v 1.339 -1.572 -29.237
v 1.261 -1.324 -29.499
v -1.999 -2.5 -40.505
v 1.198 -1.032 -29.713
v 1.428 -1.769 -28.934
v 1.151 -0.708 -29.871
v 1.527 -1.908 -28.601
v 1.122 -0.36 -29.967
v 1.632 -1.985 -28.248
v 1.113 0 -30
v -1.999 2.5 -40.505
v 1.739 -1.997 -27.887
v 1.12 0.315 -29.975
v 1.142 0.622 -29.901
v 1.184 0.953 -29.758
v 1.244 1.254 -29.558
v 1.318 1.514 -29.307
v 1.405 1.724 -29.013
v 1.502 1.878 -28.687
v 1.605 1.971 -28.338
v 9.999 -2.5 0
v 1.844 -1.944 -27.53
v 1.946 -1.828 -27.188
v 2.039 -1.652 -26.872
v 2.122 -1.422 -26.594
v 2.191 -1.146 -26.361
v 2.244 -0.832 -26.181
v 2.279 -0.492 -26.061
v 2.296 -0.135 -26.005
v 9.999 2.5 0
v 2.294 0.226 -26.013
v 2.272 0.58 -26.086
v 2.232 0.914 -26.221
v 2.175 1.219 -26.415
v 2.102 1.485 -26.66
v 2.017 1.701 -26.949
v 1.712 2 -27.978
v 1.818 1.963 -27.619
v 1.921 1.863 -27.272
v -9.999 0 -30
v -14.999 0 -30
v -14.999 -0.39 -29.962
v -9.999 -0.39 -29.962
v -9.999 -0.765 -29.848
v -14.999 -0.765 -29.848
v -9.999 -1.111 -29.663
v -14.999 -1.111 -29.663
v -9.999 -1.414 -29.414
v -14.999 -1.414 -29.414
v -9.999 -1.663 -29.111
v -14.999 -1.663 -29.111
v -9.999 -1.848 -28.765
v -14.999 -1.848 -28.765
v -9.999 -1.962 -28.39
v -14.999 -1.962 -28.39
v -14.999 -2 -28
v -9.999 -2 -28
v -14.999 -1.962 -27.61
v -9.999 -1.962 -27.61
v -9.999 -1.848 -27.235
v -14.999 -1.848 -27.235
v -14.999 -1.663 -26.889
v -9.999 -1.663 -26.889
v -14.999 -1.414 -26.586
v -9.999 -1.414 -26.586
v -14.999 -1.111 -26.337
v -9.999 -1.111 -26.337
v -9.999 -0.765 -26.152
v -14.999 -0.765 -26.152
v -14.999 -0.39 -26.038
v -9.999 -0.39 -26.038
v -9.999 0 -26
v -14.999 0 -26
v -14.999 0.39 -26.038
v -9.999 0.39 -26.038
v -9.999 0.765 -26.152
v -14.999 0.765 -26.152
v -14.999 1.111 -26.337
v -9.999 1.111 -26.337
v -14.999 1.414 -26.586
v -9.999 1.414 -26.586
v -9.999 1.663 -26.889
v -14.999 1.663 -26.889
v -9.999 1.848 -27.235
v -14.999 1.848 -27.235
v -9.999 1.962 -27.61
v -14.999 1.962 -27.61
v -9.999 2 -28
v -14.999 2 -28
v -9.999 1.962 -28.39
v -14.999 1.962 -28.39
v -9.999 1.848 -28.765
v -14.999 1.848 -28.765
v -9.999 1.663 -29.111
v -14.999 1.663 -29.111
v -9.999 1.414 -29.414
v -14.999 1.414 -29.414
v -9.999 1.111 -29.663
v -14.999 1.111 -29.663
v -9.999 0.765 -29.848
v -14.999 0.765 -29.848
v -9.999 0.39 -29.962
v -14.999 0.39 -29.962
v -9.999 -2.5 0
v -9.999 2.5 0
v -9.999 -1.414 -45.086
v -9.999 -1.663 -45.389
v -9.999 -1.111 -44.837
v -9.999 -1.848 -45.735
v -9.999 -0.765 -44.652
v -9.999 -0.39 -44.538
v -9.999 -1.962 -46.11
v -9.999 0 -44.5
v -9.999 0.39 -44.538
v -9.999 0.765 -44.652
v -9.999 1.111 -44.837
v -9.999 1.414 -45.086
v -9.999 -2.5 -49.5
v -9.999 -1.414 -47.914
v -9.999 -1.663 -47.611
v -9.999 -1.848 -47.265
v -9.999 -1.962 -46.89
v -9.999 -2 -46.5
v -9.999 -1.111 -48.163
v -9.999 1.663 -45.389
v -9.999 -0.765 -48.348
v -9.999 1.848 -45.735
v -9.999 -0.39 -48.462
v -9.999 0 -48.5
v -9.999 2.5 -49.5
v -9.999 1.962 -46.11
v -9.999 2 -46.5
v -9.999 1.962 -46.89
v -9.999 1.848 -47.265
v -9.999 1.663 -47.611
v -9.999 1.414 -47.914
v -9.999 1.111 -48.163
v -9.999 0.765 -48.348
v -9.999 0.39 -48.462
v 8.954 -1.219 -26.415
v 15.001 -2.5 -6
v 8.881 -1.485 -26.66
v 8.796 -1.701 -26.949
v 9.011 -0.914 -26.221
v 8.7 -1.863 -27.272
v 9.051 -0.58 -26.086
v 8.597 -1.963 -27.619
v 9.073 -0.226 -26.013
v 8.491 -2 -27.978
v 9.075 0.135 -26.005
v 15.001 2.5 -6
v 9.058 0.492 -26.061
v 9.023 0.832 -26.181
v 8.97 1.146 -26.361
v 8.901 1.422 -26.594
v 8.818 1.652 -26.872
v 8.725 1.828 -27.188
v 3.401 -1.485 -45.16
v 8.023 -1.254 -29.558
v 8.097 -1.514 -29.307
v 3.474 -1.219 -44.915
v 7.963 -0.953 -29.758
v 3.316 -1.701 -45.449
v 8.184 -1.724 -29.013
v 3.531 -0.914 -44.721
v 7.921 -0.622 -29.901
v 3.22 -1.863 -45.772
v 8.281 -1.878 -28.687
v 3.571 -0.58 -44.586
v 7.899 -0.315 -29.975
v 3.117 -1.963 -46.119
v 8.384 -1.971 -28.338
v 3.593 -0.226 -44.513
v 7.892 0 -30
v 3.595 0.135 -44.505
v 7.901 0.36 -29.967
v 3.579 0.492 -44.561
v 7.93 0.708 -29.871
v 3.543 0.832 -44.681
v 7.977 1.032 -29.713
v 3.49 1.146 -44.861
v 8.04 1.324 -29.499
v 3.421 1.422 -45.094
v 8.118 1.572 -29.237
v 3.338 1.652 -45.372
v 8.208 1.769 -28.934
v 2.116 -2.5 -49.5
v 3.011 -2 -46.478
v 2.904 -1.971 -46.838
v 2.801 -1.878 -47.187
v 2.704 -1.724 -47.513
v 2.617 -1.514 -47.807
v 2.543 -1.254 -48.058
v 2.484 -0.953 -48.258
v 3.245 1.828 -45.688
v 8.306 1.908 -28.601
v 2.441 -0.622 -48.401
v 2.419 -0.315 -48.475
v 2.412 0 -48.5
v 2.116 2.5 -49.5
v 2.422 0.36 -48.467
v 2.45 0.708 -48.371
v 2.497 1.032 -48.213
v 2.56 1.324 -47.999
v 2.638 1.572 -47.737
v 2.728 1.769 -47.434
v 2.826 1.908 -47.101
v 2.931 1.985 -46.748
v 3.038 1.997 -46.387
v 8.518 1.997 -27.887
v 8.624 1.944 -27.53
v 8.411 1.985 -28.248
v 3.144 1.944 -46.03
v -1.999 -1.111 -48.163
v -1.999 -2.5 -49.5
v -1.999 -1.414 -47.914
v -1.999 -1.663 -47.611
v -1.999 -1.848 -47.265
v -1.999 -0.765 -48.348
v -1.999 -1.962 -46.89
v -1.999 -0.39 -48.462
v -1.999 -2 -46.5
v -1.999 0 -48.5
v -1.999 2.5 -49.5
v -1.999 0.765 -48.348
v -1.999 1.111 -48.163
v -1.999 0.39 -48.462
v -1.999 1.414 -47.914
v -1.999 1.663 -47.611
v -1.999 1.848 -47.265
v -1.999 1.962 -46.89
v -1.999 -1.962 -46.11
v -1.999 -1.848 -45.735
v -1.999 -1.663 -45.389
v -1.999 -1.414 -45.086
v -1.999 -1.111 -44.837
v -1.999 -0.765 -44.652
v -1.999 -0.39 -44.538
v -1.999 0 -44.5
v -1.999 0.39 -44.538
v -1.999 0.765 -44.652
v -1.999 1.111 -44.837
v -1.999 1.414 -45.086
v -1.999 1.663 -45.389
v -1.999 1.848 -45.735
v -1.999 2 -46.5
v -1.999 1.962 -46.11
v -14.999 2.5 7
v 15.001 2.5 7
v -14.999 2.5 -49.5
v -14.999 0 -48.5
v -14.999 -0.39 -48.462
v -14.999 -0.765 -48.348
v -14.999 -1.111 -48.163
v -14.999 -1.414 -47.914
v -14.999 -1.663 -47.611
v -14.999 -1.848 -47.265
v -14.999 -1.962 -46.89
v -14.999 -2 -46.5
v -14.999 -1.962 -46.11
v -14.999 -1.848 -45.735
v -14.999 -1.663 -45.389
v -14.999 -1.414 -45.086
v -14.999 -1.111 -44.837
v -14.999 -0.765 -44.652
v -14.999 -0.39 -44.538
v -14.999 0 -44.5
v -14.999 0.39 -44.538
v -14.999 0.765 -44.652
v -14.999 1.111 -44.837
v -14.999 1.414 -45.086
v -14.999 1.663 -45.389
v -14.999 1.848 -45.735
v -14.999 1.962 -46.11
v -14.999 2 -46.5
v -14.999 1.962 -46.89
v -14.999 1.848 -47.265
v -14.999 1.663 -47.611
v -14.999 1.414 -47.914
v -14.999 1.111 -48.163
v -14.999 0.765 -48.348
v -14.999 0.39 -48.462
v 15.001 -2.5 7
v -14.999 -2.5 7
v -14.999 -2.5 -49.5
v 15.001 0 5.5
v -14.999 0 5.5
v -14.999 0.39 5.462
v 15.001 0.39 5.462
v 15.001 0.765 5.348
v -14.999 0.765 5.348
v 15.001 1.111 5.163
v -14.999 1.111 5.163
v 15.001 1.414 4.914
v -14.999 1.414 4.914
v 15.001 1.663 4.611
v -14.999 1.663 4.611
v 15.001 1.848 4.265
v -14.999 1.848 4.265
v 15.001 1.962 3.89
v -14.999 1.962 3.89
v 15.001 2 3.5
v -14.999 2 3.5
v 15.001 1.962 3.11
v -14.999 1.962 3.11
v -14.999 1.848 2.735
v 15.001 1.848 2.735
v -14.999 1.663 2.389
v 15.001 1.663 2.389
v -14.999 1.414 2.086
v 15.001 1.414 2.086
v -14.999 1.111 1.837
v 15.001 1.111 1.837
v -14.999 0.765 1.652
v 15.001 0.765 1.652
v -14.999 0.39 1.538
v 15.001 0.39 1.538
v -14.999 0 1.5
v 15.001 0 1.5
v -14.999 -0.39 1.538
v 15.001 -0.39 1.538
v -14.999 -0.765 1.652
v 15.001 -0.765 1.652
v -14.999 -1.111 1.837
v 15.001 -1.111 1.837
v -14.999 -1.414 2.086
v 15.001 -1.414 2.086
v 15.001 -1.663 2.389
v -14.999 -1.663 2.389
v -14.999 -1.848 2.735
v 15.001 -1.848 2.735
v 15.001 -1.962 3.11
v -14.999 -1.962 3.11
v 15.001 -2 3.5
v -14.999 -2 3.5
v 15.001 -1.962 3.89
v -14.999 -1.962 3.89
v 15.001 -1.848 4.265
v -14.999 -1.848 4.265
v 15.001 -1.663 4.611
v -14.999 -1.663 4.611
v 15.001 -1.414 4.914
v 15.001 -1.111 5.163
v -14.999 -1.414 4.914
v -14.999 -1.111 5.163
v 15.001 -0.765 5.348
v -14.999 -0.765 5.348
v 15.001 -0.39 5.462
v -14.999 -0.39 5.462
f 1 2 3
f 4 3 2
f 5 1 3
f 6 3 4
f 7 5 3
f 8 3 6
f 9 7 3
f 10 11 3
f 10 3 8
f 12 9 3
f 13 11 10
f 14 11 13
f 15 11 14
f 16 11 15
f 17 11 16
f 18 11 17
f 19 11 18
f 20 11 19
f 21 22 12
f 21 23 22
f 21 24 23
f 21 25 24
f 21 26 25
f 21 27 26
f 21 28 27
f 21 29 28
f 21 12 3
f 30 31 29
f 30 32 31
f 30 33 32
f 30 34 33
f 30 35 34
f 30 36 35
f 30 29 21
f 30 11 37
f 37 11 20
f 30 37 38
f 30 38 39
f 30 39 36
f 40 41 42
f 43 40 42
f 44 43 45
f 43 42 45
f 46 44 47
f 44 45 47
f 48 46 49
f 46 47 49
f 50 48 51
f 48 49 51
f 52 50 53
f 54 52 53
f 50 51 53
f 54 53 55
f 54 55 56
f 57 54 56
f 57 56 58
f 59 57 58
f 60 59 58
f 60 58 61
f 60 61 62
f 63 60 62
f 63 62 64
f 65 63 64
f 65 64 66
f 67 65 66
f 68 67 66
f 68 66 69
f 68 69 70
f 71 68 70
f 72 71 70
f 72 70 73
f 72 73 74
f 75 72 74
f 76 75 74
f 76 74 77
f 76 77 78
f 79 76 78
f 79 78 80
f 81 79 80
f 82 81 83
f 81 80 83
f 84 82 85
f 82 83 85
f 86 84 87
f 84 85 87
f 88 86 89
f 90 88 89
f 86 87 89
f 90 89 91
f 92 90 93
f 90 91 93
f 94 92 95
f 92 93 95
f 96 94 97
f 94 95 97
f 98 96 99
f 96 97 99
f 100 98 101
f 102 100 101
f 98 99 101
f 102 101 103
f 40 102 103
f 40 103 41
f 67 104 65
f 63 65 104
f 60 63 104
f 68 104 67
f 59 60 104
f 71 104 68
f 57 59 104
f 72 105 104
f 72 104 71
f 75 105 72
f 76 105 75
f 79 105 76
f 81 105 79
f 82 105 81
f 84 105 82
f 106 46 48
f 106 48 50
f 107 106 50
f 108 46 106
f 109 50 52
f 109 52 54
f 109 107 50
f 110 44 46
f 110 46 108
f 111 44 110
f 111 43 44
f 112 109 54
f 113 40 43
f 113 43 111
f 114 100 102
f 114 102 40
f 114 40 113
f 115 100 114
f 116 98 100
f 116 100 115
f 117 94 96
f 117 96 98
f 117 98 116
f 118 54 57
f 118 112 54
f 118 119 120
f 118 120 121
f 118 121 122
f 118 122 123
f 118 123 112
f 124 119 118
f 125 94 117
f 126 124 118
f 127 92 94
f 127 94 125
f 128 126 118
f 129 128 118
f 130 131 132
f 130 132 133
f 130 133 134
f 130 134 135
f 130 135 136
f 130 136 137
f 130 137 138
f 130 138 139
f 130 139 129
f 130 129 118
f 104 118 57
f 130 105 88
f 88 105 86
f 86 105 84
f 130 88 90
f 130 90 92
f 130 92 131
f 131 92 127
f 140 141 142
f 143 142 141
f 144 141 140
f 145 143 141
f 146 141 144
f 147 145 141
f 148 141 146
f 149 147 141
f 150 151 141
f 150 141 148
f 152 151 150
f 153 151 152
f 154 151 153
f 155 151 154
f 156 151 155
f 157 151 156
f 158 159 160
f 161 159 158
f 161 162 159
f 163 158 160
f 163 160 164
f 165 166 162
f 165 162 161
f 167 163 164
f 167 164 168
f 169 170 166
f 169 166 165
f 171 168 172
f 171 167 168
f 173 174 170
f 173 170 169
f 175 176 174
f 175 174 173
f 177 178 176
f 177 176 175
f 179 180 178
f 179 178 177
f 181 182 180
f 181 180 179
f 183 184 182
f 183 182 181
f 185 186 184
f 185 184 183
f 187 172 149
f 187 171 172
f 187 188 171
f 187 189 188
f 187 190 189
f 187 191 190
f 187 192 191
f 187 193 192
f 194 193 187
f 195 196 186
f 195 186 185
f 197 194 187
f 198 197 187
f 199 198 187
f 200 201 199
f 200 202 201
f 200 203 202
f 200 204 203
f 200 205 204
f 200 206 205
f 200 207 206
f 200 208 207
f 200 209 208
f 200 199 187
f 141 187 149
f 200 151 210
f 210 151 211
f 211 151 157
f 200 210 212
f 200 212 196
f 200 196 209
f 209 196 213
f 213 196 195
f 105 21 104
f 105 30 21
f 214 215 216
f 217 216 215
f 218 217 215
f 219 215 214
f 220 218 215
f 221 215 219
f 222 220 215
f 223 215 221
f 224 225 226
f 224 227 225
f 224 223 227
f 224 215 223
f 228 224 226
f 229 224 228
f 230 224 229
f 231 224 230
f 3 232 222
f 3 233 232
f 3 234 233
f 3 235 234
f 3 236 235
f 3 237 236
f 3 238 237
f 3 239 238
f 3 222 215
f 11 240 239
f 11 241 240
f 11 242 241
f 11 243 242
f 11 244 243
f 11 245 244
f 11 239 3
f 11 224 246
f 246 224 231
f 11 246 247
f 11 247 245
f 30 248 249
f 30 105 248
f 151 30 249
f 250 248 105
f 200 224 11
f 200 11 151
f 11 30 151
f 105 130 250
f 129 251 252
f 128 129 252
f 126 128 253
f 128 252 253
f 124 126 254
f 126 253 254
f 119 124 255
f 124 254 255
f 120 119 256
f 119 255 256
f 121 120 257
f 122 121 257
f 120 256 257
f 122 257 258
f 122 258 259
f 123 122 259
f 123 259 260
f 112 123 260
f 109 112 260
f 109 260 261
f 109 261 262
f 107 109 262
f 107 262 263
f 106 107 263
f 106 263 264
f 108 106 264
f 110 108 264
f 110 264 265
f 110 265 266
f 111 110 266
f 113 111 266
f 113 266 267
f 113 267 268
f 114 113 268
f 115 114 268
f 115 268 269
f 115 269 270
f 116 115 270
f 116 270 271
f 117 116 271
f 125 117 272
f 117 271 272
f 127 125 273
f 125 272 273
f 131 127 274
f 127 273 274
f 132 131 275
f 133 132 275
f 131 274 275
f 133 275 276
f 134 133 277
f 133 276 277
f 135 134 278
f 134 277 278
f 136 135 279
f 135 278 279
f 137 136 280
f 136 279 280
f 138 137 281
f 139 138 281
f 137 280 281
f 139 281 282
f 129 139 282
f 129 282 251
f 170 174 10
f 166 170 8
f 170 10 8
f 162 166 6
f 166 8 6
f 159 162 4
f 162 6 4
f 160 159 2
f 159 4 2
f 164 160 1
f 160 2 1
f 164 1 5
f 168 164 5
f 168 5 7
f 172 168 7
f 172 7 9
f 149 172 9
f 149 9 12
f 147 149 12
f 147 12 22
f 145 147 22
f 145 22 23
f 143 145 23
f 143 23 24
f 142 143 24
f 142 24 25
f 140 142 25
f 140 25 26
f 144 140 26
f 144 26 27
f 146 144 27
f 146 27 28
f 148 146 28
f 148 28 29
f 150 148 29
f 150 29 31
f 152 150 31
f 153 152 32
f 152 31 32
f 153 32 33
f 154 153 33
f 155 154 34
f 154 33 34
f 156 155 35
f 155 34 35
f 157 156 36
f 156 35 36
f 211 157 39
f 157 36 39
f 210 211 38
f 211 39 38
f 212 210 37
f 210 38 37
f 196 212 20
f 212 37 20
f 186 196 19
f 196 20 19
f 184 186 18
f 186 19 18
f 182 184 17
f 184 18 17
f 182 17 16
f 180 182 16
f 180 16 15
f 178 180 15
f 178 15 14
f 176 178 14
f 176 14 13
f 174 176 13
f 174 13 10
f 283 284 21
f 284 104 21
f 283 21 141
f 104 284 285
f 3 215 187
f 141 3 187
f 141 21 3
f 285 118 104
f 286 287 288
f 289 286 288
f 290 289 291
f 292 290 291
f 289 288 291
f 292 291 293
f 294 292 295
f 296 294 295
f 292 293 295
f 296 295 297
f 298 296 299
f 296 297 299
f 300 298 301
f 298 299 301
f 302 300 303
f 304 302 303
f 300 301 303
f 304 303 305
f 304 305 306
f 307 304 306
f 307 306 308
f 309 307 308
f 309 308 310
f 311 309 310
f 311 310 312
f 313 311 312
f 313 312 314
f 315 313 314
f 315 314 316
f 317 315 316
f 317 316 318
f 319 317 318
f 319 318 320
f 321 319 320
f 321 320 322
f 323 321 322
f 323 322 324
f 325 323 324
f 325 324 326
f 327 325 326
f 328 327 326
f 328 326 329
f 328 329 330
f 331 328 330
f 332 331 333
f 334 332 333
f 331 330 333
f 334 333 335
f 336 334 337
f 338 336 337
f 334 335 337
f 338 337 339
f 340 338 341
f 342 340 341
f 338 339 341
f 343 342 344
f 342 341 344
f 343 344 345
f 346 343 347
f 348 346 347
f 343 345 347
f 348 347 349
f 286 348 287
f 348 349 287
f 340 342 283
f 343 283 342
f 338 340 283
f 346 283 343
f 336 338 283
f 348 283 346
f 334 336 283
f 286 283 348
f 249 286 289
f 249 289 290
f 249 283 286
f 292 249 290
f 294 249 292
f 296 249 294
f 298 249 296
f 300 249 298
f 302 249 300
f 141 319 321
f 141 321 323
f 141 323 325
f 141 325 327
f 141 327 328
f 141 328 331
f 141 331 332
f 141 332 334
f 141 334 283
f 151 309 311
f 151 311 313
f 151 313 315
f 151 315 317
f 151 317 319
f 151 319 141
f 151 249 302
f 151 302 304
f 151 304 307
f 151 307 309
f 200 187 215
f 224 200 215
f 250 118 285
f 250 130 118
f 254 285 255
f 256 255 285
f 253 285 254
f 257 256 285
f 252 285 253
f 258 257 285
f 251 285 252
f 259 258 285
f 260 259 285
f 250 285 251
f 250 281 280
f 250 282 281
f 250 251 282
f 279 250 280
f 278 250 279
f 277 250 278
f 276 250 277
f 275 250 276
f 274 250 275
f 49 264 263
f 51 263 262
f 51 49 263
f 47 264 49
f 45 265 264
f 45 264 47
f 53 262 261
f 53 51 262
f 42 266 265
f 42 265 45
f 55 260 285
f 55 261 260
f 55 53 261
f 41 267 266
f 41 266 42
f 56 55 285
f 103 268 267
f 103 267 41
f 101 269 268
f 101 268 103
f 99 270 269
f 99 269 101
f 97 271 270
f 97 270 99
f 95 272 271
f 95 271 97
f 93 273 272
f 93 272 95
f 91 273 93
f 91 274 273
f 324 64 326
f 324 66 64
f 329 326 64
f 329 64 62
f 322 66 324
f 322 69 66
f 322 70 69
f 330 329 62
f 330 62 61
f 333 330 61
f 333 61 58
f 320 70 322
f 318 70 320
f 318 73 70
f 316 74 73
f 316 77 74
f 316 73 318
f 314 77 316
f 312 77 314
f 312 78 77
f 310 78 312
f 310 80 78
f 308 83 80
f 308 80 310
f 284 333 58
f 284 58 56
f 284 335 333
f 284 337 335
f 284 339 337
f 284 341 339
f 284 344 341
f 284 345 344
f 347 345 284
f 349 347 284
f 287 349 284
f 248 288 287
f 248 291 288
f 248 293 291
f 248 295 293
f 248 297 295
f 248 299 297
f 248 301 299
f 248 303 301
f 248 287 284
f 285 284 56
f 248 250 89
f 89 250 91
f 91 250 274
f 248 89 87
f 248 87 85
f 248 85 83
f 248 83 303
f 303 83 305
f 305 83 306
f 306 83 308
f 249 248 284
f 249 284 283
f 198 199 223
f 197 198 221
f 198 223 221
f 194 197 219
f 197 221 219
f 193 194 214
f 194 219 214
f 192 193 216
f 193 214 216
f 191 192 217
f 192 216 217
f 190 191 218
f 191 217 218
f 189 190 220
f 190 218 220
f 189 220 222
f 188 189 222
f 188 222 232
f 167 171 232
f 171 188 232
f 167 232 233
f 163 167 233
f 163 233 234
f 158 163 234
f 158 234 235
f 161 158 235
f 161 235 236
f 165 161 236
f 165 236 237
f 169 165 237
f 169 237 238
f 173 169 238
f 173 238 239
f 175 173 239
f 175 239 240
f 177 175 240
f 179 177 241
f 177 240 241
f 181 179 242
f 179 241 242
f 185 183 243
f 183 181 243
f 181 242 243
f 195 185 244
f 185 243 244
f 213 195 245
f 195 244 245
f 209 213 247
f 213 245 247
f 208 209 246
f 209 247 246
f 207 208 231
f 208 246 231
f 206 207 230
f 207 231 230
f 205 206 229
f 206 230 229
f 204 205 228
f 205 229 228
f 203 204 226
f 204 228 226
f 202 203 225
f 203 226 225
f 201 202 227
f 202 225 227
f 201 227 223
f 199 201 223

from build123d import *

# Parameters (mm, degrees)
BOSS_EXTRUDE1_DEPTH = 2.5
CUT_EXTRUDE1_REACH  = 59.935
SKETCH2_R           = 2


with BuildPart() as part:
    # Sketch1 → Boss-Extrude1 (new, symmetric)
    with BuildSketch(Plane(origin=(0, 0, 0), x_dir=(1, 0, 0), z_dir=(0, 1, 0))):
        Polygon((-9.999056518, 49.5), (-14.999056518, 49.5), (-14.999056518, -7), (15.000943482, -7), (15.000943482, 6), (2.115656451, 49.5), (-1.999056518, 49.5), (-1.999056518, 40.504950791), (9.999056518, 0), (-9.999056518, 0), align=None)
    extrude(amount=BOSS_EXTRUDE1_DEPTH, both=True)

    # Cut-Extrude1: up to this face of the body (flat: up to its plane)
    cut_extrude1_end = Plane(part.part.faces().sort_by_distance((15.000943482, 0, 0.5))[0])
    # Sketch2 → Cut-Extrude1 (cut, up to the picked face)
    with BuildSketch(Plane.ZY.offset(14.999056518), mode=Mode.PRIVATE) as cut_extrude1_sk1:
        with Locations(Location((-46.5, 0, 0), (0, 0, 180))):
            Circle(SKETCH2_R)
    cut_extrude1_tool1 = split(extrude(cut_extrude1_sk1.sketch, amount=-CUT_EXTRUDE1_REACH, mode=Mode.PRIVATE), bisect_by=cut_extrude1_end, keep=Keep.BOTH, mode=Mode.PRIVATE)
    # Sketch2 → Cut-Extrude1 (cut, up to the picked face)
    with BuildSketch(Plane.ZY.offset(14.999056518), mode=Mode.PRIVATE) as cut_extrude1_sk2:
        with Locations(Location((-28, 0, 0), (0, 0, 180))):
            Circle(SKETCH2_R)
    cut_extrude1_tool2 = split(extrude(cut_extrude1_sk2.sketch, amount=-CUT_EXTRUDE1_REACH, mode=Mode.PRIVATE), bisect_by=cut_extrude1_end, keep=Keep.BOTH, mode=Mode.PRIVATE)
    # Sketch2 → Cut-Extrude1 (cut, up to the picked face)
    with BuildSketch(Plane.ZY.offset(14.999056518), mode=Mode.PRIVATE) as cut_extrude1_sk3:
        with Locations((3.5, 0)):
            Circle(SKETCH2_R)
    cut_extrude1_tool3 = split(extrude(cut_extrude1_sk3.sketch, amount=-CUT_EXTRUDE1_REACH, mode=Mode.PRIVATE), bisect_by=cut_extrude1_end, keep=Keep.BOTH, mode=Mode.PRIVATE)
    add(cut_extrude1_tool1.solids().sort_by(Axis((-14.999057, 0, -46.5), (1, 0, 0)))[0], mode=Mode.SUBTRACT)
    add(cut_extrude1_tool2.solids().sort_by(Axis((-14.999057, 0, -28), (1, 0, 0)))[0], mode=Mode.SUBTRACT)
    add(cut_extrude1_tool3.solids().sort_by(Axis((-14.999057, 0, 3.5), (1, 0, 0)))[0], mode=Mode.SUBTRACT)


solid = part.part
